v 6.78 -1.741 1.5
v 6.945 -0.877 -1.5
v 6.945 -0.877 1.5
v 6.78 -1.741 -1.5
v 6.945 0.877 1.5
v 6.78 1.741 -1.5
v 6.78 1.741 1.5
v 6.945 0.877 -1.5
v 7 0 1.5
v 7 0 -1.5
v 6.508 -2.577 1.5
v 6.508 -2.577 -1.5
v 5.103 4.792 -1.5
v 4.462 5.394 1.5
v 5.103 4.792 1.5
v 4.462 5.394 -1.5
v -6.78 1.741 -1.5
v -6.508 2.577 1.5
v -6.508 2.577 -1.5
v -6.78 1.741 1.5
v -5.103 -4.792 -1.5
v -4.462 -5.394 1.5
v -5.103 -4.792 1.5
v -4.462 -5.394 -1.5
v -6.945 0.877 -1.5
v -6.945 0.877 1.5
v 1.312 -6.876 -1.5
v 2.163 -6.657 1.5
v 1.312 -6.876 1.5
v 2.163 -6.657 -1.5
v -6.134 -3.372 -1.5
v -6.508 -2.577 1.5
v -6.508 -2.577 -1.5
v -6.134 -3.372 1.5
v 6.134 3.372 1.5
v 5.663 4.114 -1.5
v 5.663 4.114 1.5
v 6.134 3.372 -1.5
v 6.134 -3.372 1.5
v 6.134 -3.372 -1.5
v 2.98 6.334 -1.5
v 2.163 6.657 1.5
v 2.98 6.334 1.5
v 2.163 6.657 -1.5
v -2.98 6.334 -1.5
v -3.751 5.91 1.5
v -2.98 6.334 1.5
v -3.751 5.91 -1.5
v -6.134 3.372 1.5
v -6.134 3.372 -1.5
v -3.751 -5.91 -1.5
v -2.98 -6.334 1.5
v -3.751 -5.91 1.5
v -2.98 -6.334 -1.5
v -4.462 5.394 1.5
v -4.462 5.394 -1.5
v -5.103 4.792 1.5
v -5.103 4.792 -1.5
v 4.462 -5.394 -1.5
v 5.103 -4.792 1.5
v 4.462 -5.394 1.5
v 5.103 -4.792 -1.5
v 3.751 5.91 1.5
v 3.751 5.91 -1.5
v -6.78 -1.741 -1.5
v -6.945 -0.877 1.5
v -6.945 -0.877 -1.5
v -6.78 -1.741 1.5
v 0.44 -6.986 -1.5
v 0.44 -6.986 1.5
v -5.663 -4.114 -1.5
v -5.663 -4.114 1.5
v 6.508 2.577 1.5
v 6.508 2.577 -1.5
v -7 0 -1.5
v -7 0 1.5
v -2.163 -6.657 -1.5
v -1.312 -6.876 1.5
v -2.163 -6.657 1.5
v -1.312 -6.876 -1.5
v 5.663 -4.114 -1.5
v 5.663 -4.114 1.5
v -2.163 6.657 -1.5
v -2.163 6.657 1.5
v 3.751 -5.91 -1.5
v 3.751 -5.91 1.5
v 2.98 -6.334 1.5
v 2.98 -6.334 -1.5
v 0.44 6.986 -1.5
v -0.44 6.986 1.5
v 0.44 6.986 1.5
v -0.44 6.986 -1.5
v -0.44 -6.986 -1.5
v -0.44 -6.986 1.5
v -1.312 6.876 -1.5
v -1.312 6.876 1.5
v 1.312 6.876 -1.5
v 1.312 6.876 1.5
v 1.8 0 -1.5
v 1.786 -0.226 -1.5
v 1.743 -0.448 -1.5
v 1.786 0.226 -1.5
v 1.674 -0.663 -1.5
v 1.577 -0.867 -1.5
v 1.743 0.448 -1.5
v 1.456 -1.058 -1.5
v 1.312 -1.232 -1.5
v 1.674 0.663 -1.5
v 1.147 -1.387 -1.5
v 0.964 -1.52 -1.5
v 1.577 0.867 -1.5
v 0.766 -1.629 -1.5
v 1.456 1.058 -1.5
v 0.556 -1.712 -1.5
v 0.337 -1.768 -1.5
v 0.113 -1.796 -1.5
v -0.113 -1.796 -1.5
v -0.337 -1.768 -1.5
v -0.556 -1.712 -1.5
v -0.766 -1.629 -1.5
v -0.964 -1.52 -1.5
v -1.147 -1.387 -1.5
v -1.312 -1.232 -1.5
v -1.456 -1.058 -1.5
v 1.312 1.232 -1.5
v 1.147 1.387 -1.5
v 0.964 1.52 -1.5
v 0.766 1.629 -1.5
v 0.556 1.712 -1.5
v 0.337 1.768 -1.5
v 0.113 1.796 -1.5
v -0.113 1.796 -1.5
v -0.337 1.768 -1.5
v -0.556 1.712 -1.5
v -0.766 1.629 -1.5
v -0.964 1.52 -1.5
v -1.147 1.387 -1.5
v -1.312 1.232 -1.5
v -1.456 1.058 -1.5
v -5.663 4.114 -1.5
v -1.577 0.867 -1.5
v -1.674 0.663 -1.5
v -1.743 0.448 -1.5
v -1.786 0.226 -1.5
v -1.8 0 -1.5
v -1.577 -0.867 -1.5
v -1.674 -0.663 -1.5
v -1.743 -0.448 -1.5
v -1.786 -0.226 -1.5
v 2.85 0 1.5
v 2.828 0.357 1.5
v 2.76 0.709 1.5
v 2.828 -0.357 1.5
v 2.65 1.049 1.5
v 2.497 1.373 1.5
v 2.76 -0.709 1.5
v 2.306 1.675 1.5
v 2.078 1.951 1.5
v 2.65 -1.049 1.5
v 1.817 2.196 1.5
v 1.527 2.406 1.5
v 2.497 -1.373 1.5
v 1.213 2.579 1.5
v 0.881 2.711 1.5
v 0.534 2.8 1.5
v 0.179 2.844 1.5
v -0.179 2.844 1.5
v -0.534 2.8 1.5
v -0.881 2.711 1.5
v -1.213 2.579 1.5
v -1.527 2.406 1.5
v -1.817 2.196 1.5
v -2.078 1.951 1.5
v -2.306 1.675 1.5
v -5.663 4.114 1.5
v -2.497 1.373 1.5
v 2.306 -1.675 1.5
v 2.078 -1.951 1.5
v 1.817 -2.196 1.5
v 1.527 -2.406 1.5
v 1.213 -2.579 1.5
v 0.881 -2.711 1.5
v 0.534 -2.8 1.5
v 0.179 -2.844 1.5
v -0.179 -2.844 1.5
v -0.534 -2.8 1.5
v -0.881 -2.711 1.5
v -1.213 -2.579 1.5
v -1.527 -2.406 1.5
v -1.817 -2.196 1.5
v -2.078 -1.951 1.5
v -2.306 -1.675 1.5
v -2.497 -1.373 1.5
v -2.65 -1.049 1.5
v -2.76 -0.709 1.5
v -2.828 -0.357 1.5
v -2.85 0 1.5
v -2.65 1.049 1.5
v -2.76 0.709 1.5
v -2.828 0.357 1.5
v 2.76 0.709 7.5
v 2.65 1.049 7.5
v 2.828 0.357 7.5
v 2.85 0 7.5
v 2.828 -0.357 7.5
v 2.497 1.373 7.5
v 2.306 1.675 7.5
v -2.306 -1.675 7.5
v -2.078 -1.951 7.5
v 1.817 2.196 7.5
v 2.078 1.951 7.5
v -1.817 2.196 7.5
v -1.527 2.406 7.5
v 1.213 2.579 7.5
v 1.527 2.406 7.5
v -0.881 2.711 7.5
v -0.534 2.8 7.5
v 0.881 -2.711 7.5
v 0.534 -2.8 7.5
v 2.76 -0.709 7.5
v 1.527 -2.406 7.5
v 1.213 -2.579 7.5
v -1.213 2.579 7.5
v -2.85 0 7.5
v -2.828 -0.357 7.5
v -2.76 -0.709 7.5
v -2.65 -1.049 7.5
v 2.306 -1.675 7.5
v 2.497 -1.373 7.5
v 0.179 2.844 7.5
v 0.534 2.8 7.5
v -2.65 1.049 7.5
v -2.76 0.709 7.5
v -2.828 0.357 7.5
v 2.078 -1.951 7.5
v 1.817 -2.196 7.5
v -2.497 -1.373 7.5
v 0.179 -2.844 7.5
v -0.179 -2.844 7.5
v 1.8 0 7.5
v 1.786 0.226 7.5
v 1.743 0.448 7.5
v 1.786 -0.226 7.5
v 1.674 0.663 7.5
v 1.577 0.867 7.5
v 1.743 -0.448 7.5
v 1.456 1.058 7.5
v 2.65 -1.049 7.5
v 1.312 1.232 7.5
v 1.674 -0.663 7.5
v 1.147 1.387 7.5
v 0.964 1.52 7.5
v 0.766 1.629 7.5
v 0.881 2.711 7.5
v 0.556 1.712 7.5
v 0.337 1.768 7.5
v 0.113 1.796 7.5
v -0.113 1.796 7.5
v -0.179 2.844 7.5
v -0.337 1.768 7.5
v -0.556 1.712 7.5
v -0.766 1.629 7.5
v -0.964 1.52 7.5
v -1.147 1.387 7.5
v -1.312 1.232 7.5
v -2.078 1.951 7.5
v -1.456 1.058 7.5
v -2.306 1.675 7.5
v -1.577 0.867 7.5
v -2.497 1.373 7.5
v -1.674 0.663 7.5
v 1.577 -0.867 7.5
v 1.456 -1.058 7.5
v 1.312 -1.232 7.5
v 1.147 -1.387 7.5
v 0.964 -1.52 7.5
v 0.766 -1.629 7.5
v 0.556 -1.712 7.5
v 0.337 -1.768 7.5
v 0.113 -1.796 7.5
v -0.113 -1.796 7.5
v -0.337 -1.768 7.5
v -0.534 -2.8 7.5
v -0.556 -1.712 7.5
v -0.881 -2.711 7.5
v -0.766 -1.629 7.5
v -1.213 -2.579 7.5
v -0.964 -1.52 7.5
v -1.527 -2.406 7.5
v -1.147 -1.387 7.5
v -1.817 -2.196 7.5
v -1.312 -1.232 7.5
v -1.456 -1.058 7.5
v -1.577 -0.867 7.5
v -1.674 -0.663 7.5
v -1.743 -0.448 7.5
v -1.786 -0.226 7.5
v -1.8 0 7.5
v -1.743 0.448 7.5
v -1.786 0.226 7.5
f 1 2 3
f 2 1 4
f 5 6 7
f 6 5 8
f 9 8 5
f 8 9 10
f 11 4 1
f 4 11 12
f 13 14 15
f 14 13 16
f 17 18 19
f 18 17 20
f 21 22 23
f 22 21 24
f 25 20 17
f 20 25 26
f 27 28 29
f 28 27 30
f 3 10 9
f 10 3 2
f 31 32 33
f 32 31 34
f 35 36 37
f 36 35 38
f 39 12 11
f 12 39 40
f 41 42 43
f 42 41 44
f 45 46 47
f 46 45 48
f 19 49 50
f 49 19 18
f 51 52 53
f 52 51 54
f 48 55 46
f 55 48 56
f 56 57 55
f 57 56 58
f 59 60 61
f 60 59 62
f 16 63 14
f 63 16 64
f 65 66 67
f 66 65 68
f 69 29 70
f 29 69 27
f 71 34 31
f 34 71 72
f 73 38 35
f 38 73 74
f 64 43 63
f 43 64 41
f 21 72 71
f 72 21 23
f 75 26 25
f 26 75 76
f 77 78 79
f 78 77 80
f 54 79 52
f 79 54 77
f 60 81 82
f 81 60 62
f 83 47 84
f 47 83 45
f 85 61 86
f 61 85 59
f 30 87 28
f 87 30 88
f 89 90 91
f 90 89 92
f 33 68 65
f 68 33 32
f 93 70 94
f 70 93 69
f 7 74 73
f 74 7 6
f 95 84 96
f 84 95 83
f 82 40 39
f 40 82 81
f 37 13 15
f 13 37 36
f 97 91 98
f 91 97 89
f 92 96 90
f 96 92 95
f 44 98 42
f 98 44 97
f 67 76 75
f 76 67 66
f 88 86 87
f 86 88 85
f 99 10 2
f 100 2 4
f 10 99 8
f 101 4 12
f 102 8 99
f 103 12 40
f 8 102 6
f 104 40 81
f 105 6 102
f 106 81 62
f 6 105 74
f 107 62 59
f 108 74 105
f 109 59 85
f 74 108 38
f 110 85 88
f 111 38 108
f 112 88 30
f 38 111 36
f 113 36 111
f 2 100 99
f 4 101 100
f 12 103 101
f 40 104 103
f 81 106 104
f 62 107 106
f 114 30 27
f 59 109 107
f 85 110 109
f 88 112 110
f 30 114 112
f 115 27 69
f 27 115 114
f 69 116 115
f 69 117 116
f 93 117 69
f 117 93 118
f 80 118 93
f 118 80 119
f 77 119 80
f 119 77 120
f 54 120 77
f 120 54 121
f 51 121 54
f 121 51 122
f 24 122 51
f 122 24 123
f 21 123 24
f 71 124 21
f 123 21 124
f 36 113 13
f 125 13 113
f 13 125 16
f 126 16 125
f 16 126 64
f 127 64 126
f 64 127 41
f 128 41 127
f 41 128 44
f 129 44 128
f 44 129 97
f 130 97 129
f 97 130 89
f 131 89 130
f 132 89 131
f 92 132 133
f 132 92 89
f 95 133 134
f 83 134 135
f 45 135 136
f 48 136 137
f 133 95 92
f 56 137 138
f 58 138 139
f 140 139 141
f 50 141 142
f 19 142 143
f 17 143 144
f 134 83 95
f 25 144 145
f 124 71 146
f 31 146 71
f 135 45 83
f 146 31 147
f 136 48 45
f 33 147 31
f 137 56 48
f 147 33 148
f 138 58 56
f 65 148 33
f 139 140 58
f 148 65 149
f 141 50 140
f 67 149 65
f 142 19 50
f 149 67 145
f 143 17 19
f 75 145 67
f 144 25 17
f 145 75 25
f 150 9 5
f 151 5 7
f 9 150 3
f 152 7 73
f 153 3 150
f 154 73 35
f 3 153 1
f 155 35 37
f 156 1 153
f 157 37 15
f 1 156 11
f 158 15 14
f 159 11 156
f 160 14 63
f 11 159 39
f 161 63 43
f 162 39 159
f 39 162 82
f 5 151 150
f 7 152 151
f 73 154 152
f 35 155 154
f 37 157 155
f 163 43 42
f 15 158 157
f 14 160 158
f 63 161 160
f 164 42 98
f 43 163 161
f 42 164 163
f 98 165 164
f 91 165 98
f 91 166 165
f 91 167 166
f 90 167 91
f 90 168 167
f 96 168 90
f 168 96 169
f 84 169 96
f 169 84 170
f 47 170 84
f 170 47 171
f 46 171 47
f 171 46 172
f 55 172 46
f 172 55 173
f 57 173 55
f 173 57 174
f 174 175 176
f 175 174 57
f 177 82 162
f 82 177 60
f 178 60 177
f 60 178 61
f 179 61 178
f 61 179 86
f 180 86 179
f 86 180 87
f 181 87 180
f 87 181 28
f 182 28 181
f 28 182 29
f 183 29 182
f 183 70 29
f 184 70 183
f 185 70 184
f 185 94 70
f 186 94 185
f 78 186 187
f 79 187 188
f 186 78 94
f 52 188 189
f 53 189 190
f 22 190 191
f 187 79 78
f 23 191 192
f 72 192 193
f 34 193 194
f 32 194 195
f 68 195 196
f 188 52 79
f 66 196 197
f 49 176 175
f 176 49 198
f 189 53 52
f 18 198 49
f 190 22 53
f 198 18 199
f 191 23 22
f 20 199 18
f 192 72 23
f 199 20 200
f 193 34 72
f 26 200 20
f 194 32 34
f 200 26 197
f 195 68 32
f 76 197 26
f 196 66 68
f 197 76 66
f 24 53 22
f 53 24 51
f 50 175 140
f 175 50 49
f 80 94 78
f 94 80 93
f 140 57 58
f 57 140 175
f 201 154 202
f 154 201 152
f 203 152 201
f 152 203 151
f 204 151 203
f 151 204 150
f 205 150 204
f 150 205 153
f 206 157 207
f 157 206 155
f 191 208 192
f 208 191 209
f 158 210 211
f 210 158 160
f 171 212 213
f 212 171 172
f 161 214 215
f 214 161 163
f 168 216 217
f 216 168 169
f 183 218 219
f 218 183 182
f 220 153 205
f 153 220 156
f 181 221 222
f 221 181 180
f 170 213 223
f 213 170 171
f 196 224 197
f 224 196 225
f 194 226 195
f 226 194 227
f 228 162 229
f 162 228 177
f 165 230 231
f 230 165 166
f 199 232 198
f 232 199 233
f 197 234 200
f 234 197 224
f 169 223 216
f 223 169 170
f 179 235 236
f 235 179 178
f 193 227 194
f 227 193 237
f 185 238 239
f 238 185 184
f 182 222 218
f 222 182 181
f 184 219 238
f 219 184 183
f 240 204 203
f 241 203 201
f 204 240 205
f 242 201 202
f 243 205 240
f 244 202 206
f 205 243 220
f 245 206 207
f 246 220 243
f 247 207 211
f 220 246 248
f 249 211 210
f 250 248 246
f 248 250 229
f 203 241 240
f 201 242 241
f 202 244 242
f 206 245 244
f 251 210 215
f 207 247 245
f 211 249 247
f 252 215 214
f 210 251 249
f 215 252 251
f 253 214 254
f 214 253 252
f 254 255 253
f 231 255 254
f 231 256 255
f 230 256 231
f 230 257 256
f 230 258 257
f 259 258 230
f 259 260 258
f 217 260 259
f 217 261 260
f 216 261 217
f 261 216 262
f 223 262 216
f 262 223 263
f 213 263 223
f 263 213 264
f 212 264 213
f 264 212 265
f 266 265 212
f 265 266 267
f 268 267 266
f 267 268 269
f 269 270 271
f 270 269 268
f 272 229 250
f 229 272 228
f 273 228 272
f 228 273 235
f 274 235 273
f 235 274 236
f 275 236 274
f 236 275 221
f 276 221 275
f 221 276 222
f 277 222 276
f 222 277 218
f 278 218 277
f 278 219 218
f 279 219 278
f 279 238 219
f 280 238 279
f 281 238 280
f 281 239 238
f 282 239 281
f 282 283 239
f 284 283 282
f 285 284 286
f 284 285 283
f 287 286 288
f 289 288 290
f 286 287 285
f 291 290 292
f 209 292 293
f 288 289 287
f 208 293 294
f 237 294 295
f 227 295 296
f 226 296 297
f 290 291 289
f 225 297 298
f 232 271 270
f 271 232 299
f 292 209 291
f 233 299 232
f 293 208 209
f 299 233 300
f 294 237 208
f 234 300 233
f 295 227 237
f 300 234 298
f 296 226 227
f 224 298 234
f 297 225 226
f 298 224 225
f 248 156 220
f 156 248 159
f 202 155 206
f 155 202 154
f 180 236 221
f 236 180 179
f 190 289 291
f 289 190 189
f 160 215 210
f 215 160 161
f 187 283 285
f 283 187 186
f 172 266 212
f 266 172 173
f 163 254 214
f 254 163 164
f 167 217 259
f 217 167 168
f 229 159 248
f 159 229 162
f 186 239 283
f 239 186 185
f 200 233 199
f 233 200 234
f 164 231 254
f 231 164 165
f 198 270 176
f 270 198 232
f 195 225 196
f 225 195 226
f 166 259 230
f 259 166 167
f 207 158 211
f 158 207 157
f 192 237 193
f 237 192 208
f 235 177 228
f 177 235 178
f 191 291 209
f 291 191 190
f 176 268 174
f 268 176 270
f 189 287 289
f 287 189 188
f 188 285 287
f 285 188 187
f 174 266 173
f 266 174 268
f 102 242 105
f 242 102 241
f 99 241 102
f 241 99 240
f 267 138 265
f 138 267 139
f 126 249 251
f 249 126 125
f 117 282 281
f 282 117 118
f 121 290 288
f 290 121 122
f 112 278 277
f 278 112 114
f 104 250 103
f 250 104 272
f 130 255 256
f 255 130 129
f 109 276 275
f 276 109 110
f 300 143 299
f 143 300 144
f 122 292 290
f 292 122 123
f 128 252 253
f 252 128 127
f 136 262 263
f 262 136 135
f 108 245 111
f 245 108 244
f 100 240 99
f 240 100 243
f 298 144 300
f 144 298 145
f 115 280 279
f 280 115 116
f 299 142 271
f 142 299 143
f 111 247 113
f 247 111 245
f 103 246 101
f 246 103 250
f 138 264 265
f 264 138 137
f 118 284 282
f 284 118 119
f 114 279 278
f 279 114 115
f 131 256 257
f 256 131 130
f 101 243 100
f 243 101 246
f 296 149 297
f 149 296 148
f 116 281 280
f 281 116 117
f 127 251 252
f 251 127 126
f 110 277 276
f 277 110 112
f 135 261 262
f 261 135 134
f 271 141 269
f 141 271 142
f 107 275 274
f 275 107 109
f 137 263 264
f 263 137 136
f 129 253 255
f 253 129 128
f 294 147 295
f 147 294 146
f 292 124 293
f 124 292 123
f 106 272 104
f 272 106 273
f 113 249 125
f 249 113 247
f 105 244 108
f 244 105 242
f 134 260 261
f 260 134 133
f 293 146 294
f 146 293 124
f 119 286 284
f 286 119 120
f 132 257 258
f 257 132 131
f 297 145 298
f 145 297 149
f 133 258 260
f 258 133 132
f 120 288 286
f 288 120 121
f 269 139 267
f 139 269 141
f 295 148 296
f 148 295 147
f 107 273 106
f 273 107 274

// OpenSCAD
$fn = 50;


difference() {
	union() {
		translate(v = [0, 0, -1.5000000000]) {
			rotate(a = [0, 0, 0]) {
				cylinder(h = 3, r = 7.0000000000);
			}
		}
		translate(v = [0, 0, -1.5000000000]) {
			rotate(a = [0, 0, 0]) {
				cylinder(h = 9, r = 2.8500000000);
			}
		}
	}
	union() {
		translate(v = [0, 0, -125.0000000000]) {
			rotate(a = [0, 0, 0]) {
				cylinder(h = 250, r = 1.8000000000);
			}
		}
	}
}
